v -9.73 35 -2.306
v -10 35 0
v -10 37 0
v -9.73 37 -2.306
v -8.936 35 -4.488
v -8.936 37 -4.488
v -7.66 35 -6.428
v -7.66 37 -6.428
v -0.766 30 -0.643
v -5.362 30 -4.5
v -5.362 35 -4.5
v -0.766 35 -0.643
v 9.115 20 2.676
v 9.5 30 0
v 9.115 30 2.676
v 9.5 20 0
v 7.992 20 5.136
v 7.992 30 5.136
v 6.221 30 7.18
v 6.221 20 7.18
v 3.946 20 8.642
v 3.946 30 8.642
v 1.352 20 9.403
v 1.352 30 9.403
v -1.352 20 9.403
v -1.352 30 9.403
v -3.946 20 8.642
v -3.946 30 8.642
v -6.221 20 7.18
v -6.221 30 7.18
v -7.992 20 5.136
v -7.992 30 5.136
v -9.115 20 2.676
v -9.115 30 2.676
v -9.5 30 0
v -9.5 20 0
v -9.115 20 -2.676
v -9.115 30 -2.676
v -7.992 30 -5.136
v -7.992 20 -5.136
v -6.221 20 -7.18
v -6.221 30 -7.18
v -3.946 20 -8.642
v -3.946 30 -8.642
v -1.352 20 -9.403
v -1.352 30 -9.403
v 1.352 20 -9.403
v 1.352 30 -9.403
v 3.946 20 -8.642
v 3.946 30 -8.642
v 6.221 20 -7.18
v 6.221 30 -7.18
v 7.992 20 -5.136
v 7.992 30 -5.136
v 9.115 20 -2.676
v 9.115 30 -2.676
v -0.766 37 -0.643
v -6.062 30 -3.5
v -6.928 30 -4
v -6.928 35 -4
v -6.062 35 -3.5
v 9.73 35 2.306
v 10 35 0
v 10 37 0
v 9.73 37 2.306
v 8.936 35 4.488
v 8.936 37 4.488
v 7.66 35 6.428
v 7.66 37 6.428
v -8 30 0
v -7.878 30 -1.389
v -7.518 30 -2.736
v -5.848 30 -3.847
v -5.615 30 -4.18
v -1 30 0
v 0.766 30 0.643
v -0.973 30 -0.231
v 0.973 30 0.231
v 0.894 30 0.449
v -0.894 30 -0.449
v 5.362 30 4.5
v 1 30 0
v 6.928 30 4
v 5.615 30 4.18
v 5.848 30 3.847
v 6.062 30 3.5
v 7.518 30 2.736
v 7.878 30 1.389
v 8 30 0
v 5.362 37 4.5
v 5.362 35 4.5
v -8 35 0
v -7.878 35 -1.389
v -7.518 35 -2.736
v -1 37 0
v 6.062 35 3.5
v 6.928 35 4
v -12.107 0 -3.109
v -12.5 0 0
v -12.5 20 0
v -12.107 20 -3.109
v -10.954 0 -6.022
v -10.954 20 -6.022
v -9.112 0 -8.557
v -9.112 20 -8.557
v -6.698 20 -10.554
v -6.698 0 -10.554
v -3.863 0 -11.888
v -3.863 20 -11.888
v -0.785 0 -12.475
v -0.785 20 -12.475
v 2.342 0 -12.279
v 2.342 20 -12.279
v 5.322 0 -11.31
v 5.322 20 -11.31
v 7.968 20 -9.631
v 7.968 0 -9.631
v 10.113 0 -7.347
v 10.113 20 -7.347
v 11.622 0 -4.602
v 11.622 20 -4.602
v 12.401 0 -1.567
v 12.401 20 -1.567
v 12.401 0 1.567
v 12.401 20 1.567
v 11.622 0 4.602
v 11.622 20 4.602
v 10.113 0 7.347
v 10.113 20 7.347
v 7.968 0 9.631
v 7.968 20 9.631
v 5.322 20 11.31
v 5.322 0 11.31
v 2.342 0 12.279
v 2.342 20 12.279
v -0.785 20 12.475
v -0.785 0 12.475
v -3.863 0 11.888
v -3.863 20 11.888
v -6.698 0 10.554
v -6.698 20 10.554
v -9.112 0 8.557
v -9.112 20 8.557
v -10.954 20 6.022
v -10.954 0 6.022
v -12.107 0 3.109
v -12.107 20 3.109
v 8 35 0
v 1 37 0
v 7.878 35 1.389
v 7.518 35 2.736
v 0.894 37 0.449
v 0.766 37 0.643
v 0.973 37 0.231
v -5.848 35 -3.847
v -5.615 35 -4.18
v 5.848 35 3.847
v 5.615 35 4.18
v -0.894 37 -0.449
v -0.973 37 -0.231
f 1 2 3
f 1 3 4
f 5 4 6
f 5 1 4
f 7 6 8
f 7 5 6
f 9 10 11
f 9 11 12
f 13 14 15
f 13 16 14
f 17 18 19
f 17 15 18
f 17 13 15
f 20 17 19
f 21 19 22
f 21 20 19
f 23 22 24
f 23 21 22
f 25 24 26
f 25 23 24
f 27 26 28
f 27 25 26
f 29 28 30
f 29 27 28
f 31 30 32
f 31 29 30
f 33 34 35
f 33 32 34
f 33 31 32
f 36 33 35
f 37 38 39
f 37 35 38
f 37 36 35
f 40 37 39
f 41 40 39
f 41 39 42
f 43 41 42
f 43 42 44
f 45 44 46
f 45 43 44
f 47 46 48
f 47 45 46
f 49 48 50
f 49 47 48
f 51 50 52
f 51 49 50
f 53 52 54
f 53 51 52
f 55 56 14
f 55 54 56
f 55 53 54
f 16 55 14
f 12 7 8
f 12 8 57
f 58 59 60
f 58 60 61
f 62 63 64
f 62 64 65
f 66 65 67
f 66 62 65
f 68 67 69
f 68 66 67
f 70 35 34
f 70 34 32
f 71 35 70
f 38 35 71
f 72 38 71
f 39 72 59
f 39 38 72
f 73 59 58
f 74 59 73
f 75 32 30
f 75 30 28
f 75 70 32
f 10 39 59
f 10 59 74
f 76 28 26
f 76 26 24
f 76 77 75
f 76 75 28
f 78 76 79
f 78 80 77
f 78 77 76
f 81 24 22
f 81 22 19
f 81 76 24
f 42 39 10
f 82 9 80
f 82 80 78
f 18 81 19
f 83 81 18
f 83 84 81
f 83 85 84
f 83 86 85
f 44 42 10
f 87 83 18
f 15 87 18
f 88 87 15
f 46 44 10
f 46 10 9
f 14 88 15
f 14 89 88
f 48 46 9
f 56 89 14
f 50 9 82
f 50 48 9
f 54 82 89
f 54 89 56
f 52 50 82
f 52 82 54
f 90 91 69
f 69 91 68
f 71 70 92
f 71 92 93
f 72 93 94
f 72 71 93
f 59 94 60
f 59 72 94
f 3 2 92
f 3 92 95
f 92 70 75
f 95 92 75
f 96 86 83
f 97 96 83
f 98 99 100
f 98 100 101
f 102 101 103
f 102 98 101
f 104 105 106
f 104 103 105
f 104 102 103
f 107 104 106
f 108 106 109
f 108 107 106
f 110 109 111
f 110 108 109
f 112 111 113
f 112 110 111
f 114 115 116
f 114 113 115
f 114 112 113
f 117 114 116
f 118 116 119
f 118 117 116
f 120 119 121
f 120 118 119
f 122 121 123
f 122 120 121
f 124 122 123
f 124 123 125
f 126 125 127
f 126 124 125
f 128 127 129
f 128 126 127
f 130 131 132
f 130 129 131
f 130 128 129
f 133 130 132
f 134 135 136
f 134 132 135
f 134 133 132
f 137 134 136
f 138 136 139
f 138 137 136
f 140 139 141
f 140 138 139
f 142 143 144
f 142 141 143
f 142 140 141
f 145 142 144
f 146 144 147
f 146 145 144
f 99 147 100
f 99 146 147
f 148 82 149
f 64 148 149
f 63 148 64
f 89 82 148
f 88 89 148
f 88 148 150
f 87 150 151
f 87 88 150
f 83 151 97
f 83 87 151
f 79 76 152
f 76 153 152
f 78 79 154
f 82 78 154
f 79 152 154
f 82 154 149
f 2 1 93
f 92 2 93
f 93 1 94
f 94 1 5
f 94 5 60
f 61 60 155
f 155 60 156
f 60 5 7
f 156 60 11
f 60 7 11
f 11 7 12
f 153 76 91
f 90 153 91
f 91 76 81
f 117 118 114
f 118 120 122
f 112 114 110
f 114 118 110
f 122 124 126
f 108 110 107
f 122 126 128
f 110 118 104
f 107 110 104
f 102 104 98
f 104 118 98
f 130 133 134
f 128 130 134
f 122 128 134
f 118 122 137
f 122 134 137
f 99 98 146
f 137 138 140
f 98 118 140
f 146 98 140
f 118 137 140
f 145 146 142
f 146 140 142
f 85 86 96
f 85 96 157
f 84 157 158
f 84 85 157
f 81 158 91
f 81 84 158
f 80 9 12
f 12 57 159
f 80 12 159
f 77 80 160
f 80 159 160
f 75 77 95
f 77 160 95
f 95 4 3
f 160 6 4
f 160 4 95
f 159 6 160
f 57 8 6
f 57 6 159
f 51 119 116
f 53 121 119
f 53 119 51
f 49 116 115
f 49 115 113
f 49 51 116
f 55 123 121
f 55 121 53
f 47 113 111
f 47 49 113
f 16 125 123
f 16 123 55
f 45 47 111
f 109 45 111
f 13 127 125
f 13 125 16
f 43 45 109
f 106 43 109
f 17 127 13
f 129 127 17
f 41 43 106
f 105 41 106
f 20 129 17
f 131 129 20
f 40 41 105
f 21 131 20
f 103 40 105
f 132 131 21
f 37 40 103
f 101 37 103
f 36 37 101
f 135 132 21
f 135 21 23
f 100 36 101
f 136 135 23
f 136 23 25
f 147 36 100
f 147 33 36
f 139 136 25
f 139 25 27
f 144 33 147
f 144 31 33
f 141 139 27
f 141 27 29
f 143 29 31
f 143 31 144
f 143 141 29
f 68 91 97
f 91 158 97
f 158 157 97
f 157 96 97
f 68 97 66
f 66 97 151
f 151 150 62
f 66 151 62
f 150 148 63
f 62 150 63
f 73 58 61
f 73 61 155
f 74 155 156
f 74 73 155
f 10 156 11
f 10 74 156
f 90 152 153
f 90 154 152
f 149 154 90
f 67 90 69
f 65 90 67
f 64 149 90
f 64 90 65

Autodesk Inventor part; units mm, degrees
ref_plane "YZ Plane" through (0, 0, 0) normal (1, 0, 0) x (0, 1, 0)
ref_plane "XZ Plane" through (0, 0, 0) normal (0, 1, 0) x (-1, 0, 0)
ref_plane "XY Plane" through (0, 0, 0) normal (0, 0, 1) x (1, 0, 0)
sketch "スケッチ1" plane through (0, 0, 0) normal (0, 1, 0) x (-1, 0, 0)
  circle A0 centre (0, 0) radius 12.5
  dimension "d0" = 25
extrude "押し出し1" add sketch "スケッチ1" along normal blind 20
sketch "スケッチ2" plane through (0, 20, 0) normal (0, 1, 0) x (1, 0, 0)
  circle A0 centre (0, 0) radius 9.5
  dimension "d3" = 19
extrude "押し出し2" add sketch "スケッチ2" along normal blind 10
sketch "スケッチ3" plane through (0, 30, 0) normal (0, 1, 0) x (1, 0, 0)
  arc A0 (-6.9282, 4) -> (-8, 0) centre (0, 0) ccw
  line L0 (0, 0) -> (-6.9282, 4) construction
  line L1 (0, 0) -> (-8, 0) construction
  circle A1 centre (0, 0) radius 9.5 projected
  arc A2 (-5.3623, 4.4995) -> (-6.0622, 3.5) centre (0, 0) ccw
  line L2 (0, 0) -> (-5.3623, 4.4995) construction
  line L3 (0, 0) -> (-6.0622, 3.5) construction
  arc A3 (6.9282, -4) -> (8, 0) centre (0, 0) ccw
  line L4 (0, 0) -> (6.9282, -4) construction
  line L5 (0, 0) -> (8, 0) construction
  arc A4 (5.3623, -4.4995) -> (6.0622, -3.5) centre (0, 0) ccw
  line L6 (0, 0) -> (5.3623, -4.4995) construction
  line L7 (0, 0) -> (6.0622, -3.5) construction
  line L8 (-5.3623, 4.4995) -> (0, 0)
  line L9 (-6.9282, 4) -> (0, 0)
  line L10 (-8, 0) -> (0, 0)
  line L11 (0, 0) -> (8, 0)
  line L12 (0, 0) -> (6.9282, -4)
  line L13 (0, 0) -> (5.3623, -4.4995)
  point P0 (-6.0622, 3.5)
  point P1 (6.0622, -3.5)
  dimension "d6" = 8
  dimension "d7" = 30
  dimension "d8" = 7
  dimension "d9" = 10
  dimension "d10" = 8
  dimension "d11" = 30
  dimension "d12" = 7
  dimension "d13" = 10
extrude "押し出し3" add sketch "スケッチ3" along normal blind 5 contours L9 L10 A0 | L11 A3 L12 | L12 A4 L13 | A2 L8 L9
sketch "スケッチ4" plane through (0, 35, 0) normal (0, 1, 0) x (1, 0, 0)
  line L0 (8, 0) -> (0, 0) projected
  arc A0 (-7.6604, 6.4279) -> (-10, 0) centre (0, 0) ccw
  line L1 (0, 0) -> (-7.6604, 6.4279) construction
  line L2 (0, 0) -> (-10, 0) construction
  line L3 (0, 0) -> (5.3623, -4.4995) projected
  arc A1 (7.6604, -6.4279) -> (10, 0) centre (0, 0) ccw
  line L4 (0, 0) -> (7.6604, -6.4279) construction
  line L5 (0, 0) -> (10, 0) construction
  line L6 (-7.6604, 6.4279) -> (0, 0)
  line L7 (0, 0) -> (-10, 0)
  line L8 (0, 0) -> (-10, 0)
  line L9 (0, 0) -> (10, 0)
  line L10 (-8, 0) -> (0, 0) projected
  line L11 (0, 0) -> (7.6604, -6.4279)
  dimension "d16" = 10
  dimension "d17" = 40
  dimension "d18" = 10
  dimension "d19" = 40
extrude "押し出し4" add sketch "スケッチ4" along normal blind 2
sketch "スケッチ5" plane through (0, 37, 0) normal (0, 1, 0) x (1, 0, 0)
  line L0 (0, 0) -> (-8, 0) projected
  circle A0 centre (0, 0) radius 1
  dimension "d22" = 2
extrude "押し出し5" cut sketch "スケッチ5" against normal blind 7
properties part number "kumi3"
